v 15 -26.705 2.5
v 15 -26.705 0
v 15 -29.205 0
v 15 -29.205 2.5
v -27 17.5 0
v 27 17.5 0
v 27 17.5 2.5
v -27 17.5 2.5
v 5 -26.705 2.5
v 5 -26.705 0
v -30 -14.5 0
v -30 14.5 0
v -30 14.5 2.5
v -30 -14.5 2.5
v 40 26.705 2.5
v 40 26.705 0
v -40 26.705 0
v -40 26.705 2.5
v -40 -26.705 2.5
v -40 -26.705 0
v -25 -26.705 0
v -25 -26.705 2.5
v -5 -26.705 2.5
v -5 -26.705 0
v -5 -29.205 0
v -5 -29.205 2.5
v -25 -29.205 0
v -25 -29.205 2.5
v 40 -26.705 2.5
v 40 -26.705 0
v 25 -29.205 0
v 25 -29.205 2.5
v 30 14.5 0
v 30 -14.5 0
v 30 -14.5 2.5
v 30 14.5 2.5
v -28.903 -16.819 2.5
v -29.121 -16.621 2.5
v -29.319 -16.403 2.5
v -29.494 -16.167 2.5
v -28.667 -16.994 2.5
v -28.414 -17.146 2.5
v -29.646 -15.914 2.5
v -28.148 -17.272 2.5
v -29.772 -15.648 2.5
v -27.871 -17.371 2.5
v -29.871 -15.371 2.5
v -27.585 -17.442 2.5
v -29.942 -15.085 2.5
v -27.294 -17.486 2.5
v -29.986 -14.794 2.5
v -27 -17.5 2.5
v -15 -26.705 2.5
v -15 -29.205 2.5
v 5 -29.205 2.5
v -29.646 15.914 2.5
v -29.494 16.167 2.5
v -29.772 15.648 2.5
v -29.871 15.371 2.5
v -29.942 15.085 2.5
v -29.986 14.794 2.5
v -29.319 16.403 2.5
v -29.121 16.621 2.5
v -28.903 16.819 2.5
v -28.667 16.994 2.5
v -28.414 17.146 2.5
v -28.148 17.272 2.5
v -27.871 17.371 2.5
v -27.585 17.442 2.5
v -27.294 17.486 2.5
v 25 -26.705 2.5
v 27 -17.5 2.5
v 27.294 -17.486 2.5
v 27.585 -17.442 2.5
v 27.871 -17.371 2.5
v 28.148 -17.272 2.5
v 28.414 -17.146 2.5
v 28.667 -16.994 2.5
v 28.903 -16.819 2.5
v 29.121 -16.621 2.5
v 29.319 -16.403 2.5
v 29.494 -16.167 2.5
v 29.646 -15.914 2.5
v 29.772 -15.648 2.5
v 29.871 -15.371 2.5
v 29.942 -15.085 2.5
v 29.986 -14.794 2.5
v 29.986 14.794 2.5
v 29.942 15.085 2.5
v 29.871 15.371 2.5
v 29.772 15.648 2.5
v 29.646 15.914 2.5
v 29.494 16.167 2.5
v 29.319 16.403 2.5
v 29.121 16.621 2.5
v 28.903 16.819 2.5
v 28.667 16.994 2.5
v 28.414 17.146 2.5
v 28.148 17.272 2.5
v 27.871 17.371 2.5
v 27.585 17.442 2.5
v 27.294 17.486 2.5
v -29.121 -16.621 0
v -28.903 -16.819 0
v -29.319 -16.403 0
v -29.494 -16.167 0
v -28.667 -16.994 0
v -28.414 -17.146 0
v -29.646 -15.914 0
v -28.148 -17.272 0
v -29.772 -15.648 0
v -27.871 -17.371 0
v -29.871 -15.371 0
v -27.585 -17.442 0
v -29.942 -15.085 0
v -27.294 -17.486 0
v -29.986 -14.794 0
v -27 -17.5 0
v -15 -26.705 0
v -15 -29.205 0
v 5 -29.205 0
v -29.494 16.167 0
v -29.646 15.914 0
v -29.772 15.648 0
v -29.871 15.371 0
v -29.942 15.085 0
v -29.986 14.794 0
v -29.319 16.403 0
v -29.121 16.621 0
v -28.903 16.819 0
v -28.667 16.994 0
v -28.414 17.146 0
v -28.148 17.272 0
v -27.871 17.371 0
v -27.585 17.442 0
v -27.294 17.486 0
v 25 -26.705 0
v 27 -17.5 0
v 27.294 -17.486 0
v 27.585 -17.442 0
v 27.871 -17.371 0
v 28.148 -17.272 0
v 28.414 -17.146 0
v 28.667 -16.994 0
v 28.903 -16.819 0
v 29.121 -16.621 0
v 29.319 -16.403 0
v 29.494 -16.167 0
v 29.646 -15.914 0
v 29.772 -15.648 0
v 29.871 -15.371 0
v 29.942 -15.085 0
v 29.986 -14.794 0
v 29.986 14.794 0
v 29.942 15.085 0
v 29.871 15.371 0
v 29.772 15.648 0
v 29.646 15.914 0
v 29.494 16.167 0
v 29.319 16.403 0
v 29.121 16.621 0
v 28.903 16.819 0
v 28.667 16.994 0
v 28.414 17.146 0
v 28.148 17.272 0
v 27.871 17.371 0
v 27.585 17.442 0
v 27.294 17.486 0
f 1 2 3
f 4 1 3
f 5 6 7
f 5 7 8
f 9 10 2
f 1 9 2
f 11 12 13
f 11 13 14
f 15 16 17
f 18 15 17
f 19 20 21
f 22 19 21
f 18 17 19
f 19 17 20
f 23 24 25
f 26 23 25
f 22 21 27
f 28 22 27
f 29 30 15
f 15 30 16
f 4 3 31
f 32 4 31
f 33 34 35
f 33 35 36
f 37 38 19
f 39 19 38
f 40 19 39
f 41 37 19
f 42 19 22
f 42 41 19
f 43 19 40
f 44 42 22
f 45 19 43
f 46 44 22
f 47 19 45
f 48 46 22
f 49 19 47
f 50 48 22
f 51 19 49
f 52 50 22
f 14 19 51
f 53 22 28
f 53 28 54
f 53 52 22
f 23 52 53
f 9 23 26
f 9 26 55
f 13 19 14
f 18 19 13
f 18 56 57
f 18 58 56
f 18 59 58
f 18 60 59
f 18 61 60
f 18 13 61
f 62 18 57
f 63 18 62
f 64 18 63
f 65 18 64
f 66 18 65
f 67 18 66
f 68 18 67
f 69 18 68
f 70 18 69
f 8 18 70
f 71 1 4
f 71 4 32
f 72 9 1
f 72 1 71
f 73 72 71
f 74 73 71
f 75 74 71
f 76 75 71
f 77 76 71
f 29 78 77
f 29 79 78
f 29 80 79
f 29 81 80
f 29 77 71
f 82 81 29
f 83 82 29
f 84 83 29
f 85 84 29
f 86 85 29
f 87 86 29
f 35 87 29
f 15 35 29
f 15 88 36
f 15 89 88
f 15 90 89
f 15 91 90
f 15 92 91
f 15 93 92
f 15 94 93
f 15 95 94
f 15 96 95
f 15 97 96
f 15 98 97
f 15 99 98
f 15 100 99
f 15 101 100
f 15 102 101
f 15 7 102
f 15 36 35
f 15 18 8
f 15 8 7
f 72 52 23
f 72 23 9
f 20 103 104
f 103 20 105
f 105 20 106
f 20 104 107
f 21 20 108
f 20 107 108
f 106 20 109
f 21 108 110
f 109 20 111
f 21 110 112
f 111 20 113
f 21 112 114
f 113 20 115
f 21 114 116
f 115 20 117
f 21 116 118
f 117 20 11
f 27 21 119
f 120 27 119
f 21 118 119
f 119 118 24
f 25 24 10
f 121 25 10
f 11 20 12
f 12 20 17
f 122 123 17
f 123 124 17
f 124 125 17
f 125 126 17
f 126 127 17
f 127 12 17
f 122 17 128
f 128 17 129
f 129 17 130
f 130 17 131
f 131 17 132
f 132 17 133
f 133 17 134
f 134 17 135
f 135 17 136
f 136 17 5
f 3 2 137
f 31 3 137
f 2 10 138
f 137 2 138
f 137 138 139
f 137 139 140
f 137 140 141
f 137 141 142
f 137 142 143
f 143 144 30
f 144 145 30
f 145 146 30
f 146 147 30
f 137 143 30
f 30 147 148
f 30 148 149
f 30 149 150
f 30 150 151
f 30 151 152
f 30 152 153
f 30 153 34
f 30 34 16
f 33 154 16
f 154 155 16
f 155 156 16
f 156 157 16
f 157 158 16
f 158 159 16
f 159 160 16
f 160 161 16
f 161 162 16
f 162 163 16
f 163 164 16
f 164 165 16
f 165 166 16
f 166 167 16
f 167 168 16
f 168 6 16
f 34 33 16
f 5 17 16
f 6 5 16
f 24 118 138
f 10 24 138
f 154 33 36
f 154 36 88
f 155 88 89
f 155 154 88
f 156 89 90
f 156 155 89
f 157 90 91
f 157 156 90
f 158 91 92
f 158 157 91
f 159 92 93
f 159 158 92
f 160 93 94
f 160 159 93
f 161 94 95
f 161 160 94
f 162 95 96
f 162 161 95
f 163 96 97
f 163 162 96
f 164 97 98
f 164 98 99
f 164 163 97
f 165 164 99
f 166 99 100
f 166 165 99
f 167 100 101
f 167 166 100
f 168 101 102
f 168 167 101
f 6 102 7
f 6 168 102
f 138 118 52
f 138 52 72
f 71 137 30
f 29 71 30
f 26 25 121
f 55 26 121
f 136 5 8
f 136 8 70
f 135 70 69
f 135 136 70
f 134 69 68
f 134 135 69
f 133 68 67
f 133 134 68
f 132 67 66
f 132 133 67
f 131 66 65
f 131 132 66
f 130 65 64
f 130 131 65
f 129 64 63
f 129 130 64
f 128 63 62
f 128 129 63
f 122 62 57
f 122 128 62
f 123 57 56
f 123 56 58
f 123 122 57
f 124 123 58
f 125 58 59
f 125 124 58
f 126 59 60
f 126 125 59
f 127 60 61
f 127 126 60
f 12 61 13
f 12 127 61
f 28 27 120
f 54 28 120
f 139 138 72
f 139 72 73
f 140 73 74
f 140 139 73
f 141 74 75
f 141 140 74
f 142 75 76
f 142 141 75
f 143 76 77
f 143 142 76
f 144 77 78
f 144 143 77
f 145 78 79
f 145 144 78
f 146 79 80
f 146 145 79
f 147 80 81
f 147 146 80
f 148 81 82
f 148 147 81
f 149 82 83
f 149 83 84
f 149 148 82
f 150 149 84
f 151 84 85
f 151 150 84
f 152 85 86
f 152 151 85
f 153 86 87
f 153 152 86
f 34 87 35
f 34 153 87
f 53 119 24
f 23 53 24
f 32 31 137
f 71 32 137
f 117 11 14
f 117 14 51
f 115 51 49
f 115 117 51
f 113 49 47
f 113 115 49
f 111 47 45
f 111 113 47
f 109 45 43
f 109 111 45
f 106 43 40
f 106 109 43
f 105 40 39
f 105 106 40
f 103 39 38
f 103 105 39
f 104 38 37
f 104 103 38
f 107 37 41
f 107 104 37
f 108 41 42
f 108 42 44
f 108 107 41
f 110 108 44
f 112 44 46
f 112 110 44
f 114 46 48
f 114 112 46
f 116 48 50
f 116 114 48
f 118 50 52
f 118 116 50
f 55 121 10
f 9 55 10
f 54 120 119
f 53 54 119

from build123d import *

# Parameters (mm, degrees)
BOSS_EXTRUDE1_DEPTH = 2.5


with BuildPart() as part:
    # Sketch1 → Boss-Extrude1 (new body)
    with BuildSketch(Plane.XY):
        Polygon((-40, -26.705), (-25, -26.705), (-25, -29.205), (-15, -29.205), (-15, -26.705), (-5, -26.705), (-5, -29.205), (5, -29.205), (5, -26.705), (15, -26.705), (15, -29.205), (25, -29.205), (25, -26.705), (35, -26.705), (40, -26.705), (40, 26.705), (-40, 26.705), align=None)
        with BuildLine():
            Line((-27, -17.5), (27, -17.5))
            ThreePointArc((27, -17.5), (29.121320344, -16.621320344), (30, -14.5))
            Line((30, -14.5), (30, 14.5))
            ThreePointArc((30, 14.5), (29.121320344, 16.621320344), (27, 17.5))
            Line((27, 17.5), (-27, 17.5))
            ThreePointArc((-27, 17.5), (-29.121320344, 16.621320344), (-30, 14.5))
            Line((-30, 14.5), (-30, -14.5))
            ThreePointArc((-30, -14.5), (-29.121320344, -16.621320344), (-27, -17.5))
        make_face(mode=Mode.SUBTRACT)
    extrude(amount=BOSS_EXTRUDE1_DEPTH)


solid = part.part
